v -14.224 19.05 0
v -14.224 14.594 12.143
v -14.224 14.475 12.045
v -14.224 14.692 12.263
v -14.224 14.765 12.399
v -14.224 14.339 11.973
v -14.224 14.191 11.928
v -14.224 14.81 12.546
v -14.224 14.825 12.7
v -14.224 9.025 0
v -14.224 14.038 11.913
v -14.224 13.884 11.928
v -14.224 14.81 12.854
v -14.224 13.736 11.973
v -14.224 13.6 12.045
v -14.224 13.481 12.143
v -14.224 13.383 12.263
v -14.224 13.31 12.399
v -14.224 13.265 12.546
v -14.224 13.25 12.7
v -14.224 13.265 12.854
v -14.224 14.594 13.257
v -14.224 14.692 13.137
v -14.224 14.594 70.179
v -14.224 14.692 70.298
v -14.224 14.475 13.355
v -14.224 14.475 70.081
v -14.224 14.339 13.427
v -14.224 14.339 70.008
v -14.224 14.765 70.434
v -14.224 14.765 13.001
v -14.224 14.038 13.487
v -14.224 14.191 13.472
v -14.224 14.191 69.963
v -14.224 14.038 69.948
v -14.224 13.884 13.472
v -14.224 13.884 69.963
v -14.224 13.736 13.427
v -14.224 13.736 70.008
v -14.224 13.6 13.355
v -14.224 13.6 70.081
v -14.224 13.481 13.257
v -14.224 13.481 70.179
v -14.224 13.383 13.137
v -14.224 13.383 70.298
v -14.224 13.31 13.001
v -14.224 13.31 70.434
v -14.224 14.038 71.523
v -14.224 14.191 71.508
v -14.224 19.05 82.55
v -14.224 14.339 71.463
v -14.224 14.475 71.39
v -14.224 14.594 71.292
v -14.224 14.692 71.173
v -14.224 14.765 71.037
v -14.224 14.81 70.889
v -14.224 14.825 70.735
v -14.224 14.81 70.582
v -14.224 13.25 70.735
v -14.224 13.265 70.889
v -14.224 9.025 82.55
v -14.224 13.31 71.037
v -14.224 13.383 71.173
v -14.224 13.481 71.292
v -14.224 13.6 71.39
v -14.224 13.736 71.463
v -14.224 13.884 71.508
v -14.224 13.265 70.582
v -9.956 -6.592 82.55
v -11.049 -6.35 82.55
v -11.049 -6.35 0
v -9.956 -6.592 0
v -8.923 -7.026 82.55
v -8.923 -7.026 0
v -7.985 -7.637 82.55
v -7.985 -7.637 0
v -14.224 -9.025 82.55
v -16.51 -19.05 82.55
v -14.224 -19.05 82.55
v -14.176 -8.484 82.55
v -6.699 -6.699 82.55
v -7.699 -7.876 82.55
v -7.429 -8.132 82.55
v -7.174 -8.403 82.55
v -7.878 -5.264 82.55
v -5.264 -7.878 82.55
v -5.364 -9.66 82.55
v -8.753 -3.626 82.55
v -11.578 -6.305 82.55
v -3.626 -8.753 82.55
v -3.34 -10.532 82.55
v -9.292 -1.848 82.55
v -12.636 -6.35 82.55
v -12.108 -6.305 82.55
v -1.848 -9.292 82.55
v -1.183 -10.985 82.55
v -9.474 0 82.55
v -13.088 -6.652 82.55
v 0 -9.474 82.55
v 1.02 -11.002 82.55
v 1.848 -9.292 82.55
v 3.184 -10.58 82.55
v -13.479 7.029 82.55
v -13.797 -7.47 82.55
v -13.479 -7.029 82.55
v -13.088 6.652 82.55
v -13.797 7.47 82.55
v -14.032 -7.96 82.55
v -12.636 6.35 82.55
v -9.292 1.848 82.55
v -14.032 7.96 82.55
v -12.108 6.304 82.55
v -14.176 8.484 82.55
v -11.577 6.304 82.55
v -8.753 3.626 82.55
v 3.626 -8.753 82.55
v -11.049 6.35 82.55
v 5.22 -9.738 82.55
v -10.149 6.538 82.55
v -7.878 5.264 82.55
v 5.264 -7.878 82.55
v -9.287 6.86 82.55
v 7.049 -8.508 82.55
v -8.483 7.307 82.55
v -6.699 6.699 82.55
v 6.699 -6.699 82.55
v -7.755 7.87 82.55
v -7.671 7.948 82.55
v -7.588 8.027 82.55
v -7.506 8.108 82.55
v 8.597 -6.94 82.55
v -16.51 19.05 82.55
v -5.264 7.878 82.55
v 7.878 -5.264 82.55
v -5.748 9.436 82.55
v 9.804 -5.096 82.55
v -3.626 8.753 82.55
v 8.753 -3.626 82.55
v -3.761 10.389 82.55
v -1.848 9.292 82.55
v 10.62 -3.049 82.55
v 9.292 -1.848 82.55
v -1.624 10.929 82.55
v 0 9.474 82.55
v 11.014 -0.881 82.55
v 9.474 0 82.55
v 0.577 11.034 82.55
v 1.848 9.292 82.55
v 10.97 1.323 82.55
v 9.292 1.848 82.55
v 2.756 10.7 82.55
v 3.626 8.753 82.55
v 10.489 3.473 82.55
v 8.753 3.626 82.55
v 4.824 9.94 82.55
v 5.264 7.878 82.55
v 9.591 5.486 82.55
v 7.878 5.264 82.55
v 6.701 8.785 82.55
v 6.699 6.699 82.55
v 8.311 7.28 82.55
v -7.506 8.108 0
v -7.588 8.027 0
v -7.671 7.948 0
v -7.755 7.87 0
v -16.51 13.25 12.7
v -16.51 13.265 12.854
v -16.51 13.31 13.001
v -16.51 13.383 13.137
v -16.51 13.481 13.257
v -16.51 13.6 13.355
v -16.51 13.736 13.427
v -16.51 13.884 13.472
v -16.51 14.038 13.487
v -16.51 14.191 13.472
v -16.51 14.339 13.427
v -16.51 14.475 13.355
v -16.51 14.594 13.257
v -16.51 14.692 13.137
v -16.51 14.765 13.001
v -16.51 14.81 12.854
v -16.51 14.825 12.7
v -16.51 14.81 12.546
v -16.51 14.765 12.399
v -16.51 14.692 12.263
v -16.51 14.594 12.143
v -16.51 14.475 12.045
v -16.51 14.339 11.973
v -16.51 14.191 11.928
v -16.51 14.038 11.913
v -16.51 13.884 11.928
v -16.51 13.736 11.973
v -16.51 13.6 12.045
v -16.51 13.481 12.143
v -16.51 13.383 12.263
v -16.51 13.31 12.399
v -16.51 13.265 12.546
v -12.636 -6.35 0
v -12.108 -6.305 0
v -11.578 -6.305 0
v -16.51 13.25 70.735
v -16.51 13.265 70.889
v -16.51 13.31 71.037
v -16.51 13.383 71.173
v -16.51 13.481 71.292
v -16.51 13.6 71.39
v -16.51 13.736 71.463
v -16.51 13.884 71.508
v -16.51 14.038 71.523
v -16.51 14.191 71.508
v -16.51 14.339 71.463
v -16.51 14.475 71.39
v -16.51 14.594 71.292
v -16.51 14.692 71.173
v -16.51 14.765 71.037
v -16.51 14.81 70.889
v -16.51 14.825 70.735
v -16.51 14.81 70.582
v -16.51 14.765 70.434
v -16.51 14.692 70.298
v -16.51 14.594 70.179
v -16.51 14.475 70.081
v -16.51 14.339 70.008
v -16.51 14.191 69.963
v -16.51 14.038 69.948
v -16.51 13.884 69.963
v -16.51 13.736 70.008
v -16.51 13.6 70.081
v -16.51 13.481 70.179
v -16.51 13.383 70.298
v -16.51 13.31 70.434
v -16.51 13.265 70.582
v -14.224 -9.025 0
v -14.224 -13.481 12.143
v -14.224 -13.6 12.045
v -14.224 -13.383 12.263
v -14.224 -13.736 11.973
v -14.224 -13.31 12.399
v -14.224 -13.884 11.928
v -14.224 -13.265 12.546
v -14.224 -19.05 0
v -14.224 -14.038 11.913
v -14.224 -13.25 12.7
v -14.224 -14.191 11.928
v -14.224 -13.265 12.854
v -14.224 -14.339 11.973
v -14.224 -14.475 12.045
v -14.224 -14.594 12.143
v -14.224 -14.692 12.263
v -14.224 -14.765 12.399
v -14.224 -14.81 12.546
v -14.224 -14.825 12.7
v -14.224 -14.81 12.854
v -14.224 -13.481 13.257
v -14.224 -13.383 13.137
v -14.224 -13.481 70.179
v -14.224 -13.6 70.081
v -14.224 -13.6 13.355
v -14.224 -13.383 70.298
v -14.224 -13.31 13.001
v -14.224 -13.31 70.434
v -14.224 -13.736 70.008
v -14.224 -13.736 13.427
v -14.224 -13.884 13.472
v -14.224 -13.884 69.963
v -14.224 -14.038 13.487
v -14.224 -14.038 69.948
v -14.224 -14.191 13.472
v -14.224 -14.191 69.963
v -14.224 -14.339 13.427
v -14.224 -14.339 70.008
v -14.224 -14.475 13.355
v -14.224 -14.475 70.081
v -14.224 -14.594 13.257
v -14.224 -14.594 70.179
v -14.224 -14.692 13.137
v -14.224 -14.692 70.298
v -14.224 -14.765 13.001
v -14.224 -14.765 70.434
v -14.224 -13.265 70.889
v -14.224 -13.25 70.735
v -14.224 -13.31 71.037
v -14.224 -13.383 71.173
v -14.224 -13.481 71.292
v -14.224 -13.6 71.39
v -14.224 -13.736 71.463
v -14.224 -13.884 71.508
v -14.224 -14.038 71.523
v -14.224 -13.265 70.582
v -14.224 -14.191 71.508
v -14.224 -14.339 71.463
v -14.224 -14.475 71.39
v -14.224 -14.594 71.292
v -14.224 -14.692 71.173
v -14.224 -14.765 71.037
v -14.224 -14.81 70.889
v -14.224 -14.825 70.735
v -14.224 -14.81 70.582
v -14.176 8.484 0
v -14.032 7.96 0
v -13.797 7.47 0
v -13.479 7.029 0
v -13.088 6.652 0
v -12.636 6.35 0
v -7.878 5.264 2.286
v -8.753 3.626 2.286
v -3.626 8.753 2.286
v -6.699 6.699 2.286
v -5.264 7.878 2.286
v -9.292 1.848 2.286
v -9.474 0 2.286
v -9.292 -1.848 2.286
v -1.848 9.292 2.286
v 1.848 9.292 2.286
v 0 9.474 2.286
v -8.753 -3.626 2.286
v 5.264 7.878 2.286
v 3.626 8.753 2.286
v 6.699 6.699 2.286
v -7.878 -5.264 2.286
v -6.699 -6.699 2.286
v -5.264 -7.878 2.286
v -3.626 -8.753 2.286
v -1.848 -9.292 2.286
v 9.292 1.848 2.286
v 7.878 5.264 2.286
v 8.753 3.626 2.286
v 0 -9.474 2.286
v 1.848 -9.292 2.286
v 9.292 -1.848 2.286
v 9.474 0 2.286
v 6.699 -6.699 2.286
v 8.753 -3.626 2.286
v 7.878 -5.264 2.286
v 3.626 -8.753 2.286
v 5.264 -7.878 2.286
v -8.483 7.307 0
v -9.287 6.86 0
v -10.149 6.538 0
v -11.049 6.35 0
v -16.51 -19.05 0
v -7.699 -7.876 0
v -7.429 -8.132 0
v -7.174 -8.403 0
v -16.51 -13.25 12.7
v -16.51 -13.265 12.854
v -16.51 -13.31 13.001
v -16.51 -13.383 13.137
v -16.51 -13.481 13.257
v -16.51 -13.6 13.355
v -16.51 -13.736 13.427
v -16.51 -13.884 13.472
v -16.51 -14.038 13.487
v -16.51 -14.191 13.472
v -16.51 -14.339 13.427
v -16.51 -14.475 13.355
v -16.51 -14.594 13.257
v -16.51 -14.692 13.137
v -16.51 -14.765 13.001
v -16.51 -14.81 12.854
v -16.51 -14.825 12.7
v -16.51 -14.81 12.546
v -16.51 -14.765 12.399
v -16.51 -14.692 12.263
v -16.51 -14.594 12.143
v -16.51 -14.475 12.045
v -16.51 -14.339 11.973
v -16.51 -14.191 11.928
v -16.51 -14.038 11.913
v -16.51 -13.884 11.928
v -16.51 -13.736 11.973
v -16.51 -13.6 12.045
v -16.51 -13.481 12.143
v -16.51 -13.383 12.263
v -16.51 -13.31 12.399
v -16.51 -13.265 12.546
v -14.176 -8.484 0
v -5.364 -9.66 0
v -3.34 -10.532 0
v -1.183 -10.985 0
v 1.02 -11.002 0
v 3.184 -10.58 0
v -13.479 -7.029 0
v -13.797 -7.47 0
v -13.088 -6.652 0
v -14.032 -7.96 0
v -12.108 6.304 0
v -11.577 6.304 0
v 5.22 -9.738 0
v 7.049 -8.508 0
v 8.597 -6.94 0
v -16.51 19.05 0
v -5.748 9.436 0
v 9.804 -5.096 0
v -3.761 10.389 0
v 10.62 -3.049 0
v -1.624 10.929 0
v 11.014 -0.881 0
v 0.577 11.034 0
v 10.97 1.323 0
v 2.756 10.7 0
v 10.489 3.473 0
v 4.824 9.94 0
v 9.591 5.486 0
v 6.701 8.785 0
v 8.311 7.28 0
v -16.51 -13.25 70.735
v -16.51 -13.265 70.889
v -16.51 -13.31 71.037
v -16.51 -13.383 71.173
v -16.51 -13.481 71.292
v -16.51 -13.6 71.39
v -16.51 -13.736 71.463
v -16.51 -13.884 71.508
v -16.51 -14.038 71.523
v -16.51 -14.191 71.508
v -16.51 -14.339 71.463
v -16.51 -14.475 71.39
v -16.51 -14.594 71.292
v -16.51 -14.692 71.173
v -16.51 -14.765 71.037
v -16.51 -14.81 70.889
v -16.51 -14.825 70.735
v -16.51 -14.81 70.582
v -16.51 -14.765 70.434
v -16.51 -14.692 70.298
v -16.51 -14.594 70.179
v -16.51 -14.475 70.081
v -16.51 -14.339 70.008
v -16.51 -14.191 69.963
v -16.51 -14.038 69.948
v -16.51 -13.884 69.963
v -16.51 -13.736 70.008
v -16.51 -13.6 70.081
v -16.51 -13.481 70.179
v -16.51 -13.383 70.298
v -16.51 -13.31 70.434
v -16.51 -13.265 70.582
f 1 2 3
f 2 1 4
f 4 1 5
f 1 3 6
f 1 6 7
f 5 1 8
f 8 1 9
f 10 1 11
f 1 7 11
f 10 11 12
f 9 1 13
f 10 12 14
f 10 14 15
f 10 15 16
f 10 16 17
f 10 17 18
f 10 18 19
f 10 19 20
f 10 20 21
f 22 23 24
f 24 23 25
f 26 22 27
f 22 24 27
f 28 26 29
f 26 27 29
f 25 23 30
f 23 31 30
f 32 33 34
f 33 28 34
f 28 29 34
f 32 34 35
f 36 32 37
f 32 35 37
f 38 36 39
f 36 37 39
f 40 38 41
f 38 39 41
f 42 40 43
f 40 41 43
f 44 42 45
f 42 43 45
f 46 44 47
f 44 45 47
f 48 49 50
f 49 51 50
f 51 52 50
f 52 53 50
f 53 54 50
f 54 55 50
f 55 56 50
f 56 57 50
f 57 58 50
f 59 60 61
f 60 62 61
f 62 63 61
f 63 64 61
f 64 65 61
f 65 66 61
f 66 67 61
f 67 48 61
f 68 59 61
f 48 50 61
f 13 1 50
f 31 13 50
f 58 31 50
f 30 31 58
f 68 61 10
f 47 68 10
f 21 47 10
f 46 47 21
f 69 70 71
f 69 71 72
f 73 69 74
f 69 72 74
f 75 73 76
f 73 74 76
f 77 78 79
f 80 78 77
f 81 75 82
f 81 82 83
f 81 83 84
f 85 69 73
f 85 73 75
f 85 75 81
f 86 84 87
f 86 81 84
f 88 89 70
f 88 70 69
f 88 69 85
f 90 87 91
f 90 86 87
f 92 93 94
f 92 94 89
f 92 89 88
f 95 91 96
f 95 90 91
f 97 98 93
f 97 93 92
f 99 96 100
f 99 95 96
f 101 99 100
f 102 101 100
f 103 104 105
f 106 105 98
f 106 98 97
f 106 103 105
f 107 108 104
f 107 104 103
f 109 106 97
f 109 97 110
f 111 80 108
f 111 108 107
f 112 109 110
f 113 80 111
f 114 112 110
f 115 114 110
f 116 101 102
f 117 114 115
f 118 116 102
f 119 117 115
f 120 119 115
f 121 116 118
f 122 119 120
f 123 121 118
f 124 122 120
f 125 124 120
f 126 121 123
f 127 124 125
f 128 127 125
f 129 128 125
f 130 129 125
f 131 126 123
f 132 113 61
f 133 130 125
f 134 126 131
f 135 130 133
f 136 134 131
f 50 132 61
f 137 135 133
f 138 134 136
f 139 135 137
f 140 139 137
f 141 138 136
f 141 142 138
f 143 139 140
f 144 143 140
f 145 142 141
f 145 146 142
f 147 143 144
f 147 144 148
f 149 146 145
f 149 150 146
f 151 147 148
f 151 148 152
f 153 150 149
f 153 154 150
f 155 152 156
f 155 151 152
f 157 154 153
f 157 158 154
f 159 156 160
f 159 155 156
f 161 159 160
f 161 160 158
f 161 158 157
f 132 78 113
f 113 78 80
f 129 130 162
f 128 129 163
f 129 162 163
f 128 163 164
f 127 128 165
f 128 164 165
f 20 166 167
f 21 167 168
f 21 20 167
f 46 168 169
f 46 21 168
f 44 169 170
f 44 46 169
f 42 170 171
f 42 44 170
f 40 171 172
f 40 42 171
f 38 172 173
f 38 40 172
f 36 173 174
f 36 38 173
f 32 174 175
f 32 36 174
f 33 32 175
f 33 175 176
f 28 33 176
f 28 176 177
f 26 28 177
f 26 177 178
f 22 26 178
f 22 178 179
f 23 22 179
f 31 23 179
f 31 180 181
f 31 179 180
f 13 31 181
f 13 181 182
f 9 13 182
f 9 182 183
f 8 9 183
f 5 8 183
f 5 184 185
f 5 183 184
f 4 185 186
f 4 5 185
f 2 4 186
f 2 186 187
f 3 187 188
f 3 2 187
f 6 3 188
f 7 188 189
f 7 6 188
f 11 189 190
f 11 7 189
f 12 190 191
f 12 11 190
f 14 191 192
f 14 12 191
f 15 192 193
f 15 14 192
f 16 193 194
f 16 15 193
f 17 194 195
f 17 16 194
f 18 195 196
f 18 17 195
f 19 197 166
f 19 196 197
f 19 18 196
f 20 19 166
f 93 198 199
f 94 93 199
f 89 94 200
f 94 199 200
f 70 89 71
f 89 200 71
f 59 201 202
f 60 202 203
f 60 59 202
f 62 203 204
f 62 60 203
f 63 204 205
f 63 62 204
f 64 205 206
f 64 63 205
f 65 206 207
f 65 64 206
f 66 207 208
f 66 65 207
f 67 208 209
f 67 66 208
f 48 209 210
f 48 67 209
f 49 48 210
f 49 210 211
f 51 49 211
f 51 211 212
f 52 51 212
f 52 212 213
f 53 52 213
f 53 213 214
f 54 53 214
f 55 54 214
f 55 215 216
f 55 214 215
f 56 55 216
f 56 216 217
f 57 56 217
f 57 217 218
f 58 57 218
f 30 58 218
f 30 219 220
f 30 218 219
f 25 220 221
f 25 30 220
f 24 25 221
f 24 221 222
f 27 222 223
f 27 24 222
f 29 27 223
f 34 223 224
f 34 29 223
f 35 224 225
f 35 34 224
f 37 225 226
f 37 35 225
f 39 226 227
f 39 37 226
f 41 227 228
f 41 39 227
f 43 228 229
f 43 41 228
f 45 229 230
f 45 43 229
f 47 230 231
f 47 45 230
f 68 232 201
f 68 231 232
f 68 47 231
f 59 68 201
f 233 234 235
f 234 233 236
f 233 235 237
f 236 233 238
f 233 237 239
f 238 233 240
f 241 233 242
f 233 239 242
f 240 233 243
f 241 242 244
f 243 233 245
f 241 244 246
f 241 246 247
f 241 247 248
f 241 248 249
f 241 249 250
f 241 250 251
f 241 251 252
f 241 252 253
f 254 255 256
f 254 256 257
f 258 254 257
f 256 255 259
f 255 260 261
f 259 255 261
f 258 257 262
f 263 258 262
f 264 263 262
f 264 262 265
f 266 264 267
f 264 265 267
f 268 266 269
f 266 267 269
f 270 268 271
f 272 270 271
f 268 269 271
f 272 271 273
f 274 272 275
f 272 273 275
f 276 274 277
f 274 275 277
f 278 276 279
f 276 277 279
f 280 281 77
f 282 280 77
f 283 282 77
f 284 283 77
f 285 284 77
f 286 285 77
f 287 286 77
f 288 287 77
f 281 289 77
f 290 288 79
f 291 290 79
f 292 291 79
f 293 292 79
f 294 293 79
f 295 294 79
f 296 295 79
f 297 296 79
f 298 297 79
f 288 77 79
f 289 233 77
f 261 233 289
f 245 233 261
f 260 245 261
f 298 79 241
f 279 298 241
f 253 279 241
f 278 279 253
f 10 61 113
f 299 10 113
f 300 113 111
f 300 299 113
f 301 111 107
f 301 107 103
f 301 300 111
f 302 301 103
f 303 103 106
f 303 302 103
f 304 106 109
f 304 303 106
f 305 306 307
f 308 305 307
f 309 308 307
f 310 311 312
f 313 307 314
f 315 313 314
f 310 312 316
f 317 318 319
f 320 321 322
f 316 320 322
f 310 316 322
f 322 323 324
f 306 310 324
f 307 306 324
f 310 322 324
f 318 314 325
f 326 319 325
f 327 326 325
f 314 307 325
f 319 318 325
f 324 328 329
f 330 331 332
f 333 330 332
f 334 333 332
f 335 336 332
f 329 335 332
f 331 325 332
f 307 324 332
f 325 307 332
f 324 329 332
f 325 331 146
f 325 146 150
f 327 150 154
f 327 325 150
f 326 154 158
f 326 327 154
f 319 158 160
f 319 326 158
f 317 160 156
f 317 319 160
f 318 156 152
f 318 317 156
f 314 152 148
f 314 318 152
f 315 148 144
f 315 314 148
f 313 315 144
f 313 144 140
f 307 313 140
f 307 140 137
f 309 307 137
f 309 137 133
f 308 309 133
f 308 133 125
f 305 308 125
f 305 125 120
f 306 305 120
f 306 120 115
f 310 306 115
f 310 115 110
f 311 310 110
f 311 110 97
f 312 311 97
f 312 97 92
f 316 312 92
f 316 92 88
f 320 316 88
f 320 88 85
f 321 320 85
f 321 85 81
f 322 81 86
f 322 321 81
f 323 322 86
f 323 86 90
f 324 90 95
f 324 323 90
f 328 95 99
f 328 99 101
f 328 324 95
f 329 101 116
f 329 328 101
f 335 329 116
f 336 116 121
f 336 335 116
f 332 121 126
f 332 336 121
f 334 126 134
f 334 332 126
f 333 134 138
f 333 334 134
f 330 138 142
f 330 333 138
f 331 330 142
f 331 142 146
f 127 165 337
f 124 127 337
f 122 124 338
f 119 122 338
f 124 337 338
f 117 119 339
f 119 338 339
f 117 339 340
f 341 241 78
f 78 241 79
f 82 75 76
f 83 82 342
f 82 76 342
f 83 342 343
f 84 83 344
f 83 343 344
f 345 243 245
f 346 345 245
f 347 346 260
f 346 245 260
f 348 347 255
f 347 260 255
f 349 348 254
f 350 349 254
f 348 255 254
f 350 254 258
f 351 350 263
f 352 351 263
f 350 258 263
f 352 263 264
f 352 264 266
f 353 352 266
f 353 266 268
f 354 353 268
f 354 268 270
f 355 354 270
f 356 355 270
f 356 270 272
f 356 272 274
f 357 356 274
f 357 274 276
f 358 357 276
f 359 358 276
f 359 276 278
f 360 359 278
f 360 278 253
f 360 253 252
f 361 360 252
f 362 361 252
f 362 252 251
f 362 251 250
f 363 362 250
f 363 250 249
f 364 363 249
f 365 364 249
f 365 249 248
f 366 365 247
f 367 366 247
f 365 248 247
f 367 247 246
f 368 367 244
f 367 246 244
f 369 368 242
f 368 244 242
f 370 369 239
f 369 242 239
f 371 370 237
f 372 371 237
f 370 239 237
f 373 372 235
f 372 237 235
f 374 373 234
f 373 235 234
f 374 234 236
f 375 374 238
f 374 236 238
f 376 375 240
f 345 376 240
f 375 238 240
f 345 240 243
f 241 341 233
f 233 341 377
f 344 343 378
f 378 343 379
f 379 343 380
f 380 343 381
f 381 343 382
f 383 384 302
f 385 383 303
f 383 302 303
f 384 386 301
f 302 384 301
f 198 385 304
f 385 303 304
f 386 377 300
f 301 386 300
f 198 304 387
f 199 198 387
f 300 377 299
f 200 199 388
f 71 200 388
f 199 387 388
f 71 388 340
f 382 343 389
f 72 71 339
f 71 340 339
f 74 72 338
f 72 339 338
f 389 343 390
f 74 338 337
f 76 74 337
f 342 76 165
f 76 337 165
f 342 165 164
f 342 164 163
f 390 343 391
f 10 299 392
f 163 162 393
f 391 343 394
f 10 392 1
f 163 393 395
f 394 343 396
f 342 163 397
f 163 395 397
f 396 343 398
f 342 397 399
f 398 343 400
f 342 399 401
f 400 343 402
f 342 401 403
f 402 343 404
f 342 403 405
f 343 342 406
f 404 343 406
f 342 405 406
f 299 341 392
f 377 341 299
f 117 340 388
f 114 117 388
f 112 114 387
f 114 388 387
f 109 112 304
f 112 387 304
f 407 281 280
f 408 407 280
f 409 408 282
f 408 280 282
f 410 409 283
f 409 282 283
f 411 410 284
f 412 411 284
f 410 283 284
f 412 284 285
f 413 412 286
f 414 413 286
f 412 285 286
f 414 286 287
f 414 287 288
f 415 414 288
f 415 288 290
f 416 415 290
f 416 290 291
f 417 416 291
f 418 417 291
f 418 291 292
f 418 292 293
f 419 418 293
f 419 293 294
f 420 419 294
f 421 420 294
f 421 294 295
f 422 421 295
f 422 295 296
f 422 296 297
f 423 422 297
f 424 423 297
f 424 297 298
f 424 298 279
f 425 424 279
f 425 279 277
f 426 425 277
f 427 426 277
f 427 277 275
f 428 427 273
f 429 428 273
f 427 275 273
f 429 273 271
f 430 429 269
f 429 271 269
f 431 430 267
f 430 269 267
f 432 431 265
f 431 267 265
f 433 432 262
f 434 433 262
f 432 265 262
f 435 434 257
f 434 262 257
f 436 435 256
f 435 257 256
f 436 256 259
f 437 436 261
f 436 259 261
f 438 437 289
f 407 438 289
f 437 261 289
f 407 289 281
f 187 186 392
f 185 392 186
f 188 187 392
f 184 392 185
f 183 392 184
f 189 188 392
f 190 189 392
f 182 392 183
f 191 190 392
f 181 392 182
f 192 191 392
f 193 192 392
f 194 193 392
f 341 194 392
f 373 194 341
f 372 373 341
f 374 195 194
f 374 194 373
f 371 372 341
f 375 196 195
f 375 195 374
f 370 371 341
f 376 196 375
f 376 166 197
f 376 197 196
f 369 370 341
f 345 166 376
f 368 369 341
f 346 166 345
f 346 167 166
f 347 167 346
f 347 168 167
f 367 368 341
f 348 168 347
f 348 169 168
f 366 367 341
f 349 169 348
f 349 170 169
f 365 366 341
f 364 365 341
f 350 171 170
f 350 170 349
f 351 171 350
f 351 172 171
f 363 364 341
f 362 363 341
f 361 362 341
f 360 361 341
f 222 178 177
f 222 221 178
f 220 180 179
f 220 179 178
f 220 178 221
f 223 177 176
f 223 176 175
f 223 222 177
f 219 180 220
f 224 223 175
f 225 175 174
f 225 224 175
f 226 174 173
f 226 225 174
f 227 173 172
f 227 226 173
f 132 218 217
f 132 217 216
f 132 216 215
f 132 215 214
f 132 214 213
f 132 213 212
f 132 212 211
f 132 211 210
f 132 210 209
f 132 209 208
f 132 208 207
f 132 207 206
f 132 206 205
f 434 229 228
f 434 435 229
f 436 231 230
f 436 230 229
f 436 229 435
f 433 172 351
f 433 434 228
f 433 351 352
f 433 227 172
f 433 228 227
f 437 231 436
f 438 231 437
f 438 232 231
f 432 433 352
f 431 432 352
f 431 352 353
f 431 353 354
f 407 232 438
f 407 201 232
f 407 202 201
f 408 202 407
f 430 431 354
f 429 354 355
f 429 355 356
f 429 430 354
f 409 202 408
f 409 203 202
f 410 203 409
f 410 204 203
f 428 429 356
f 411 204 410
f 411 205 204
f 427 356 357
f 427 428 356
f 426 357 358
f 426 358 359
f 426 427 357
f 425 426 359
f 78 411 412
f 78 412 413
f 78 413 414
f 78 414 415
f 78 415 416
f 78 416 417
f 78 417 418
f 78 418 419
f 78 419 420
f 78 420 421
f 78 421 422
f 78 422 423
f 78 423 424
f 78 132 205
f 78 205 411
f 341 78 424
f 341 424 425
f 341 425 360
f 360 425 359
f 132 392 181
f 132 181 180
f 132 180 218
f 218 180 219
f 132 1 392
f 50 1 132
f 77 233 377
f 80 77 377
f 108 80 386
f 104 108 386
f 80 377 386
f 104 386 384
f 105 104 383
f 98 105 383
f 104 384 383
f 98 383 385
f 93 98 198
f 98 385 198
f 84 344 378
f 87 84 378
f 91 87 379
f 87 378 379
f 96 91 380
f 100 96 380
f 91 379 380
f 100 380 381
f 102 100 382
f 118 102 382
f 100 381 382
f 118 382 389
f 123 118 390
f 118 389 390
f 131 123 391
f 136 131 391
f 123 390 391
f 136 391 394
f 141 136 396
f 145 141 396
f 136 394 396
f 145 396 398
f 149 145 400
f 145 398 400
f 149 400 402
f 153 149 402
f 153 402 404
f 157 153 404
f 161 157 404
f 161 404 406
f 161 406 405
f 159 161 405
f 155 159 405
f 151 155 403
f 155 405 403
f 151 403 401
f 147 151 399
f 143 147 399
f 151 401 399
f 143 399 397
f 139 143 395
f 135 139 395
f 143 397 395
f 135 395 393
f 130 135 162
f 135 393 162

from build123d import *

# Parameters (mm, degrees)
F0_R        = 9.4742
F1_DEPTH    = 82.55
F2_R        = 9.4742
F3_DEPTH    = 2.286
F4_W        = 12.7000000767
F4_H        = 82.55
F4_W_2      = 12.7
F5_DEPTH    = 2.286
F6_T1_DEPTH = 82.55
F7_R        = 0.7874
F8_DEPTH    = 13.208


# Not quite as in the source:
# - a fillet or chamfer that OpenCascade refuses, or shapes differently, is made with other operations: its cross-section is extruded or revolved along the edge and cut away or added
# - a pattern or mirror of a feature is missing from the dataset's text; its kind, count and spacing are read off the source's solid


with BuildPart() as f1:
    # F0 (on Top) → F1 (new body)
    with BuildSketch(Plane.XY):
        with BuildLine():
            ThreePointArc((-11.049, -6.3499999233), (-9.4295157118, -6.785458523), (-7.9847846533, -7.6369899201))
            ThreePointArc((-7.9847846533, -7.6369899201), (-7.5622828297, -8.001877119), (-7.1741300574, -8.4031100742))
            ThreePointArc((-7.1741300574, -8.4031100742), (11.0467672464, 0.2221134929), (-7.5061119691, 8.1079395723))
            ThreePointArc((-7.5061119691, 8.1079395723), (-7.6290075774, 7.9871909027), (-7.755263928, 7.8699607628))
            ThreePointArc((-7.755263928, 7.8699607628), (-9.2865444962, 6.859503776), (-11.049, 6.35))
            ThreePointArc((-11.049, 6.35), (-11.84275, 6.2981423564), (-12.6365, 6.35))
            Line((-12.6365, 6.35), (-14.224, 6.35))
            Line((-14.224, 6.35), (-14.224, -6.3499999233))
            Line((-14.224, -6.3499999233), (-12.6365, -6.3499999233))
            ThreePointArc((-12.6365, -6.3499999233), (-11.84275, -6.2992439038), (-11.049, -6.3499999233))
        make_face()
        Circle(F0_R, mode=Mode.SUBTRACT)
    extrude(amount=F1_DEPTH)

    # F2 (on face) → F3 (join)
    with BuildSketch(Plane(origin=(0, 0, 0), x_dir=(1, 0, 0), z_dir=(0, 0, -1))):
        Circle(F2_R)
    extrude(amount=-F3_DEPTH)

    # F4 (on face) → F5 (join)
    with BuildSketch(Plane(origin=(-14.224, 0, 0), x_dir=(0, -1, 0), z_dir=(-1, 0, 0))):
        Polygon((6.3499999233, 82.55), (0, 82.55), (-6.35, 82.55), (-6.35, 0), (6.3499999233, 0), align=None)
        with Locations((12.6999999616, 41.275)):
            Rectangle(F4_W, F4_H)
        with Locations((-12.7, 41.275)):
            Rectangle(F4_W_2, F4_H)
    extrude(amount=F5_DEPTH)

    # F6: fillet of radius 3.048 on 2 edges, made by hand

    # F6_s2 → F6_t1 (join)
    with BuildSketch(Plane.XY):
        with BuildLine():
            ThreePointArc((-14.224, -9.0253024762), (-13.7972504649, -7.4698764896), (-12.6365, -6.3499999233))
            Line((-12.6365, -6.3499999233), (-14.224, -6.3499999233))
            Line((-14.224, -6.3499999233), (-14.224, -9.0253024762))
        make_face()
        with BuildLine():
            ThreePointArc((-14.224, 9.025302553), (-13.7972504649, 7.4698765663), (-12.6365, 6.35))
            Line((-12.6365, 6.35), (-14.224, 6.35))
            Line((-14.224, 6.35), (-14.224, 9.025302553))
        make_face()
    extrude(amount=F6_T1_DEPTH)

    # F7 (on face) → F8 (cut)
    with BuildSketch(Plane.YZ.offset(-14.224)):
        with Locations((-14.0376512381, 70.7353055477)):
            Circle(F7_R)
        with Locations((-14.0376512381, 12.7)):
            Circle(F7_R)
    f8 = extrude(amount=-F8_DEPTH, mode=Mode.SUBTRACT)

    # F8_copies: F8 across plane
    add(f8.mirror(Plane.ZX), mode=Mode.SUBTRACT)


solid = f1.part
